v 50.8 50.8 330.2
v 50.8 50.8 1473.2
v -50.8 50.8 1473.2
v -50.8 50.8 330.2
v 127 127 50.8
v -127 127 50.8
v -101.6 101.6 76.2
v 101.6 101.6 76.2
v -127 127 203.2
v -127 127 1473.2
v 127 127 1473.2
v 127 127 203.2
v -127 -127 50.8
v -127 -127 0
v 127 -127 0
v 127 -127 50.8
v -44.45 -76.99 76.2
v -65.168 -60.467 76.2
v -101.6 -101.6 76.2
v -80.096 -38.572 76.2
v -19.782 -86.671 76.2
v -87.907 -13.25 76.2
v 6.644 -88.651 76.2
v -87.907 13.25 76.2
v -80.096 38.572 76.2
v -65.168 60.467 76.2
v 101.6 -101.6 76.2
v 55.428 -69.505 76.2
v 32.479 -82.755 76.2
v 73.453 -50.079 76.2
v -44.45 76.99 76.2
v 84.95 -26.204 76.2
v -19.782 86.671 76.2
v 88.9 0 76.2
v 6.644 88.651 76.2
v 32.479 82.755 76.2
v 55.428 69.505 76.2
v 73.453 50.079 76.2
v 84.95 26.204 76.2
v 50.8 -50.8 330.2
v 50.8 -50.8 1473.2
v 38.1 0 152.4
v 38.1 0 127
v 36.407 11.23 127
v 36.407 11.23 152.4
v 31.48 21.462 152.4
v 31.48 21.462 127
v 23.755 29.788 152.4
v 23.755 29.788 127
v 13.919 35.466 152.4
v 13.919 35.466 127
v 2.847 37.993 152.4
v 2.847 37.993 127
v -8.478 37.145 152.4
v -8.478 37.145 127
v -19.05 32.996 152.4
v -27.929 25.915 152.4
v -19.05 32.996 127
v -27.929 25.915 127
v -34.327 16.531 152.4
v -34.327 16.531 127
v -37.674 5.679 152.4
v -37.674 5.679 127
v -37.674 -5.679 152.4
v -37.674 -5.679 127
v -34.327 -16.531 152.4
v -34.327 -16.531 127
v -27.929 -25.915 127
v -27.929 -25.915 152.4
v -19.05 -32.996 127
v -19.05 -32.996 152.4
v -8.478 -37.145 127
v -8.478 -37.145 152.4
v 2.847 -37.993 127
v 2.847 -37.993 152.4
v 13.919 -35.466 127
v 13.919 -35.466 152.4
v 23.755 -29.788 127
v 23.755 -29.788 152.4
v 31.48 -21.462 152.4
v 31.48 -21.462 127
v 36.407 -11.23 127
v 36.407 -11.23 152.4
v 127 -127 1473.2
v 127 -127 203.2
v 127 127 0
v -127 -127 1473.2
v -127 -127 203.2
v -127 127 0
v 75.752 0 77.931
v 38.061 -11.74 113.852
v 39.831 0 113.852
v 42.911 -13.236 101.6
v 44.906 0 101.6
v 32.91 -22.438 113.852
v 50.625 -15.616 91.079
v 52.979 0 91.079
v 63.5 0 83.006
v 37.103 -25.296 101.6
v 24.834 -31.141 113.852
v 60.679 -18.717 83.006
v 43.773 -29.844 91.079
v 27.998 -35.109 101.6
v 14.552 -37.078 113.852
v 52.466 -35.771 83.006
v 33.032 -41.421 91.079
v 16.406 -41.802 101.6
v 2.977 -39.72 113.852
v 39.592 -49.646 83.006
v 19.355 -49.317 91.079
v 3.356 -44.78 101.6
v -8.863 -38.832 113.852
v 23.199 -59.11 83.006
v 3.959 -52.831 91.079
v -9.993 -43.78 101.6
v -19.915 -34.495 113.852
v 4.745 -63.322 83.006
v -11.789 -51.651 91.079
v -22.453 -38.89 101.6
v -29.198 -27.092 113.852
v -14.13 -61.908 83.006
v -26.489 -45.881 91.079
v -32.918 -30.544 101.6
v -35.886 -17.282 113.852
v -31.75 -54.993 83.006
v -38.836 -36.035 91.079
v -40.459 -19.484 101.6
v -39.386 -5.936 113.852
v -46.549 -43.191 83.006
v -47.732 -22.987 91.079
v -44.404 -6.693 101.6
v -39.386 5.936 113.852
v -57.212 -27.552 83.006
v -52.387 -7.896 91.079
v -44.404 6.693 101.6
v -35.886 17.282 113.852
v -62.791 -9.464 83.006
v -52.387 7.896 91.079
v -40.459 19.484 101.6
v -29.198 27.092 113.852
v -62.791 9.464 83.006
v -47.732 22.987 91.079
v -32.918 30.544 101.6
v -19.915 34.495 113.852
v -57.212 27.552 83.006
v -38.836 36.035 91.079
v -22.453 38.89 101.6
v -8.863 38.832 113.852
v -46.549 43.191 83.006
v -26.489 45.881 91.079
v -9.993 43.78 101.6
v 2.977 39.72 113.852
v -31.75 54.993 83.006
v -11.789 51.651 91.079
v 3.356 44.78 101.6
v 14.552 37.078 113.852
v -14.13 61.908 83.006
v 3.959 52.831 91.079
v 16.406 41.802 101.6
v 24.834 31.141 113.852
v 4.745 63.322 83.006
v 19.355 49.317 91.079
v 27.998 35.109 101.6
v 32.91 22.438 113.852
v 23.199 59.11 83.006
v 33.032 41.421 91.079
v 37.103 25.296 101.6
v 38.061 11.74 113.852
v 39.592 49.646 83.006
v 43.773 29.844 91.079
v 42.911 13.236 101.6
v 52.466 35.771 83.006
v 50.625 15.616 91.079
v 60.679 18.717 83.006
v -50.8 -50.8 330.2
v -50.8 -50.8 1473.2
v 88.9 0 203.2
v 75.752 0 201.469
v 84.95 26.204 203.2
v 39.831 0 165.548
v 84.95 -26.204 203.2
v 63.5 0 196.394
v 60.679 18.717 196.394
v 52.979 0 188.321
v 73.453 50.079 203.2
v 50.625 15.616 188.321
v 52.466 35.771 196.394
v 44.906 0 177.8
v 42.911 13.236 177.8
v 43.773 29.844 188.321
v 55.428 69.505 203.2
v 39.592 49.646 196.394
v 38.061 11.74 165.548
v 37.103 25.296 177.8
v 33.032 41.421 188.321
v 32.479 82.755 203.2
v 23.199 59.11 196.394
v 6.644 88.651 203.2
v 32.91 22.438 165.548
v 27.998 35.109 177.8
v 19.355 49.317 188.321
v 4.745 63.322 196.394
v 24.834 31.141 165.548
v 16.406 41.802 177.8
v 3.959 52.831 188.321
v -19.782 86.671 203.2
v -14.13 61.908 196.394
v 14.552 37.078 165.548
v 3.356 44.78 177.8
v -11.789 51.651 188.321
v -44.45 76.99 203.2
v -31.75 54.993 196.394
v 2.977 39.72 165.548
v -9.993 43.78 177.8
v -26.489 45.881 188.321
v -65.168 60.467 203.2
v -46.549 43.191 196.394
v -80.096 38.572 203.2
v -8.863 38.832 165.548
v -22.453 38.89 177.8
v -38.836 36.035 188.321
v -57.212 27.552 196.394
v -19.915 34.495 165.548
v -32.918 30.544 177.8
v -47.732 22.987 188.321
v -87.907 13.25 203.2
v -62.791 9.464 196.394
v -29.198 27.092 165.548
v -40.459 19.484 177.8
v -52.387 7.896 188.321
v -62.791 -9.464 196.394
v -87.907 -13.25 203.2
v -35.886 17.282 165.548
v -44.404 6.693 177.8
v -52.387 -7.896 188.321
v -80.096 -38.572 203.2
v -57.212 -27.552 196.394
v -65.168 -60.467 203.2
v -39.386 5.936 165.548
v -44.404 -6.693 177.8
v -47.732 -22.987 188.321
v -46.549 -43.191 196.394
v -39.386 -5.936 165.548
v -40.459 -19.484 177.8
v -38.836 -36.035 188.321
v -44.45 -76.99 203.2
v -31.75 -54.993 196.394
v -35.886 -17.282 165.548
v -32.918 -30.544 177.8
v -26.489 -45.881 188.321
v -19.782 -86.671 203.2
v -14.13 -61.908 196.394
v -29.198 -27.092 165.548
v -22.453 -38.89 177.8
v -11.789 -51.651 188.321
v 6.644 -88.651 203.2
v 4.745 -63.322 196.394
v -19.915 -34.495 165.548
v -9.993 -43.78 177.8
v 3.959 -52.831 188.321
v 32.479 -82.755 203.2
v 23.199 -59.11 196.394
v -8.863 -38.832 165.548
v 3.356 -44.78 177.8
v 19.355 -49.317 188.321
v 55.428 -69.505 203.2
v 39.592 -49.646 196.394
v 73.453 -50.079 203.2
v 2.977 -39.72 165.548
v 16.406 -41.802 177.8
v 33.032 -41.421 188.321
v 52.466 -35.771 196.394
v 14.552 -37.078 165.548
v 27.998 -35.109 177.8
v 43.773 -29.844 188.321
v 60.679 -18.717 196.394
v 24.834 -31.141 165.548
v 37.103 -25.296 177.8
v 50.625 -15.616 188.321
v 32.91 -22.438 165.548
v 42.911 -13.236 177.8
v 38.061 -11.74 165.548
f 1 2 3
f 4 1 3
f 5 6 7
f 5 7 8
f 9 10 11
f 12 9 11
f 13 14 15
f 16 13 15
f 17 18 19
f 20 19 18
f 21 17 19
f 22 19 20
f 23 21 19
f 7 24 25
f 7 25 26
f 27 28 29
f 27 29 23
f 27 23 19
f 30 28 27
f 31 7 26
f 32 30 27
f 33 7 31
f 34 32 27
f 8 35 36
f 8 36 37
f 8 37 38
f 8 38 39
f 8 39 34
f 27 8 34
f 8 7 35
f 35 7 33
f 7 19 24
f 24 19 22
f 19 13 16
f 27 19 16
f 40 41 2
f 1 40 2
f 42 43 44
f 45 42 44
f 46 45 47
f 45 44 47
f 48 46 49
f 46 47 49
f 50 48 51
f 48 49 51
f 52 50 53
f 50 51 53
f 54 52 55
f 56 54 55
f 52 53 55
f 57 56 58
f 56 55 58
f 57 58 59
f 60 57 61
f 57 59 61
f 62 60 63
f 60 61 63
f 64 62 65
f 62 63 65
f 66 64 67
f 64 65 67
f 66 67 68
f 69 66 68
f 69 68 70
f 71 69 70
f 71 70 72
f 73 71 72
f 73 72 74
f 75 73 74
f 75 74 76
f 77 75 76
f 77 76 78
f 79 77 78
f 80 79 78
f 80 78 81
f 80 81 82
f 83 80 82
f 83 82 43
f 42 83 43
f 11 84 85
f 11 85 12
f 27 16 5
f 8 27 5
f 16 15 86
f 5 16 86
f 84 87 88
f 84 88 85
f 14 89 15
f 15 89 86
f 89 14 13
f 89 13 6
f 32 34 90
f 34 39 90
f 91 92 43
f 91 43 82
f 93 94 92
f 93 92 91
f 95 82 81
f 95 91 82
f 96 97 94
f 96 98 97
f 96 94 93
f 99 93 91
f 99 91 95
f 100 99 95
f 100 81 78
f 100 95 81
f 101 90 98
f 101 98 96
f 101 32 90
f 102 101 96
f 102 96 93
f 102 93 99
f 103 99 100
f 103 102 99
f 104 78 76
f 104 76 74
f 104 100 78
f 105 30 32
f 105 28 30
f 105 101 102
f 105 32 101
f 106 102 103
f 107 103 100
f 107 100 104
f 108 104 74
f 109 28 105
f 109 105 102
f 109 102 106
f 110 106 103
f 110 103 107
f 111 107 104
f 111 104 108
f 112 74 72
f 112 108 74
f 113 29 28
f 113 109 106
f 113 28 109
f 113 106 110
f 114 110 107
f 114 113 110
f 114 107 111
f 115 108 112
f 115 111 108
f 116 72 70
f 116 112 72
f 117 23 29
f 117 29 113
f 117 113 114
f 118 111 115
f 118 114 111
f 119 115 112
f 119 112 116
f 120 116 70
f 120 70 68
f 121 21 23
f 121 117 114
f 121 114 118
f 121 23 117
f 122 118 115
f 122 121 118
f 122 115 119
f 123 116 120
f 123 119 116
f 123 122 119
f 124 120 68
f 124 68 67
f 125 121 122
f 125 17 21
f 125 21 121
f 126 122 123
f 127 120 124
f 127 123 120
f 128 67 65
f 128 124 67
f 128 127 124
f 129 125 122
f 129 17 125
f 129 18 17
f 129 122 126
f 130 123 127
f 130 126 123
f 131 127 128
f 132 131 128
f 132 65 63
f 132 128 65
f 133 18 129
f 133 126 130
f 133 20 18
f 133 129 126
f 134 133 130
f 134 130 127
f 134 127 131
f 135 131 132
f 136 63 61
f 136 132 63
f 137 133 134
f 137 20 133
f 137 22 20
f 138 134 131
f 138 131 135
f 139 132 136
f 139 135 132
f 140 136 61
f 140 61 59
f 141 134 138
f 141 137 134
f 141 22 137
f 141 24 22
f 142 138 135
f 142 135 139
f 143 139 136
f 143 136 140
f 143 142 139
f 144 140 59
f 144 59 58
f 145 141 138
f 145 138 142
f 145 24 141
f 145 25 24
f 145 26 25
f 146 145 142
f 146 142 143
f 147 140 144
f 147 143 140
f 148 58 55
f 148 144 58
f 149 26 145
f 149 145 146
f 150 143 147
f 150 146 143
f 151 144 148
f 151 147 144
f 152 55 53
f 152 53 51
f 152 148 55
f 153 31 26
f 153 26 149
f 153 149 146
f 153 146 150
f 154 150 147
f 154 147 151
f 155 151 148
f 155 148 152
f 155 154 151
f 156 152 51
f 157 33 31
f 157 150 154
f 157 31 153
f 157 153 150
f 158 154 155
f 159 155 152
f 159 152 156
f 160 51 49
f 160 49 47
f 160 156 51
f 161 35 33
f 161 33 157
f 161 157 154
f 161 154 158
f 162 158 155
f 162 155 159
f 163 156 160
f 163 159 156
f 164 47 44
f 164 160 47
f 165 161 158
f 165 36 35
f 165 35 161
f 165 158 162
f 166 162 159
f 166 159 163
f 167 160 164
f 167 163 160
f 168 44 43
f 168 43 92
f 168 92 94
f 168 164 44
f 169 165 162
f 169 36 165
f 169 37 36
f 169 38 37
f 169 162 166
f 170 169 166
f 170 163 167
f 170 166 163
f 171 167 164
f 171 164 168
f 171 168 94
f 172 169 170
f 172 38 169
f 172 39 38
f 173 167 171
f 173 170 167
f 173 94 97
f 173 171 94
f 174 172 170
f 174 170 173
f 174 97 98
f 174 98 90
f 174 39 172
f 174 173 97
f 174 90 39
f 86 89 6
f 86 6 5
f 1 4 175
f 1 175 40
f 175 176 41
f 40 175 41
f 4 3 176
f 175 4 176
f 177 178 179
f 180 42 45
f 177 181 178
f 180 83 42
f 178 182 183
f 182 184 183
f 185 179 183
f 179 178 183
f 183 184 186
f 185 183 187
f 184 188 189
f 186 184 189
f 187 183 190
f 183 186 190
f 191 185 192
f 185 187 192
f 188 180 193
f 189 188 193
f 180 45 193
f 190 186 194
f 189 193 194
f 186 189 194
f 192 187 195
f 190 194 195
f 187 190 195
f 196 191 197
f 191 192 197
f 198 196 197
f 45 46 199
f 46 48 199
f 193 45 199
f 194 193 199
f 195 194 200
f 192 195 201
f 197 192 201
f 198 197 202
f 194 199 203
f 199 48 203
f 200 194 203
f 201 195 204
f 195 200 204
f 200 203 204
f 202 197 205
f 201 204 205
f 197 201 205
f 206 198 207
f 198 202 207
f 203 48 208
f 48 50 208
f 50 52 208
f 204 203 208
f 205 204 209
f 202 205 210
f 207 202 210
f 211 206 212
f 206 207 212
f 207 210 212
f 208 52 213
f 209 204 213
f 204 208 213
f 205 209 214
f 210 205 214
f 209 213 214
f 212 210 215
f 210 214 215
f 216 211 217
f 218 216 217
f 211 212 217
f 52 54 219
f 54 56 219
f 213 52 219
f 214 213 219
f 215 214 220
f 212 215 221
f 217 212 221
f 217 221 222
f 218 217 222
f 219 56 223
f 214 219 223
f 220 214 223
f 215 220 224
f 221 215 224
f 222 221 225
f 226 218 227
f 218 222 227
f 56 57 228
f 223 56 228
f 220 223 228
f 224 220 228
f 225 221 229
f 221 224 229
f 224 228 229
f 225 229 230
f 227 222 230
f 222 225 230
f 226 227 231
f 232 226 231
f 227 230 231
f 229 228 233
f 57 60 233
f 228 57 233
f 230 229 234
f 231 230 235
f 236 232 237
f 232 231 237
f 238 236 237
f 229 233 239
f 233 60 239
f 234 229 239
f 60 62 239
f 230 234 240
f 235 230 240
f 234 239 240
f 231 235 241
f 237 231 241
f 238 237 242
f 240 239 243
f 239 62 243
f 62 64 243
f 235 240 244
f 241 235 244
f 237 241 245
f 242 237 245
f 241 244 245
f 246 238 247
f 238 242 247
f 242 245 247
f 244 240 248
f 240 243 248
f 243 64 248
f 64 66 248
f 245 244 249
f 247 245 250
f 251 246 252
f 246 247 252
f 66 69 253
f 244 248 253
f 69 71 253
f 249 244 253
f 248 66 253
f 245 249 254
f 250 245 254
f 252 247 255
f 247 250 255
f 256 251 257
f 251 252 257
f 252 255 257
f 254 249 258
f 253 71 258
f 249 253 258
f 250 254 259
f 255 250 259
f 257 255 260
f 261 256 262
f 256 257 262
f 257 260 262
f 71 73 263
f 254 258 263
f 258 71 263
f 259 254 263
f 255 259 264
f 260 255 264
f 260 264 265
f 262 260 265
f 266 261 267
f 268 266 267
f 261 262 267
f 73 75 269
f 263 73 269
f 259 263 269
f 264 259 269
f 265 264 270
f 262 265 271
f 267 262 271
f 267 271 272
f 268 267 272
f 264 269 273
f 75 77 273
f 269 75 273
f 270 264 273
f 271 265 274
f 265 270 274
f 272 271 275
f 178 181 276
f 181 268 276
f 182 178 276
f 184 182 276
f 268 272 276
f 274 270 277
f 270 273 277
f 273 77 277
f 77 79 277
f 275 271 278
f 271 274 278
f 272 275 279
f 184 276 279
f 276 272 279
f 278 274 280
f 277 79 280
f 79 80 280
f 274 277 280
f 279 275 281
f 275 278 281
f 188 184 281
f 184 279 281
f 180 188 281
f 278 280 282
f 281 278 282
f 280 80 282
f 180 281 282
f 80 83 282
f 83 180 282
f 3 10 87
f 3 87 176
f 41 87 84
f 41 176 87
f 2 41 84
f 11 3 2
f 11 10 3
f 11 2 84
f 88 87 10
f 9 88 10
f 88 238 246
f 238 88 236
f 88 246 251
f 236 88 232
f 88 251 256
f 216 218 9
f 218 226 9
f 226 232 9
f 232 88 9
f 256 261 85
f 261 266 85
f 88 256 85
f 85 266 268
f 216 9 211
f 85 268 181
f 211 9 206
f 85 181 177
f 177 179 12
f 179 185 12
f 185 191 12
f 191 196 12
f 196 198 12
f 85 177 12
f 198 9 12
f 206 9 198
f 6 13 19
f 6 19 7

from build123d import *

# Parameters (mm, degrees)
F0_W     = 254
F0_H     = 254
F0_R     = 38.1
F1_DEPTH = 76.2
F2_DEPTH = 203.2
F3_W     = 254
F3_H     = 254
F3_R     = 38.1
F4_DEPTH = 1270
F6_DEPTH = 1143
F7_R     = 50.8
F8_SIZE  = 25.4


with BuildPart() as f1:
    # F0 (on Top) → F1 (new body)
    with BuildSketch(Plane.XY):
        Rectangle(F0_W, F0_H)
        Circle(F0_R, mode=Mode.SUBTRACT)
        Circle(F0_R)
    extrude(amount=F1_DEPTH)

    # F0 (on Top) → F2 (join)
    with BuildSketch(Plane.XY):
        Circle(F0_R)
    extrude(amount=F2_DEPTH)

    # F3 (on face) → F4 (join)
    with BuildSketch(Plane.XY.offset(203.2)):
        Rectangle(F3_W, F3_H)
        Circle(F3_R)
    extrude(amount=F4_DEPTH)

    # F5 (on face) → F6 (cut)
    with BuildSketch(Plane.XY.offset(1473.2)):
        with BuildLine():
            Line((50.8, 0), (50.8, 50.8))
            Line((50.8, 50.8), (0, 50.8))
            ThreePointArc((0, 50.8), (35.921025, 35.921024), (50.8, 0))
        make_face()
        with BuildLine():
            Line((50.8, -50.8), (50.8, 0))
            ThreePointArc((50.8, 0), (35.921024, -35.921024), (0, -50.8))
            Line((0, -50.8), (50.8, -50.8))
        make_face()
        with BuildLine():
            ThreePointArc((0, -50.8), (-35.921024, -35.921025), (-50.8, 0))
            Line((-50.8, 0), (-50.8, -50.8))
            Line((-50.8, -50.8), (0, -50.8))
        make_face()
        with BuildLine():
            ThreePointArc((-50.8, 0), (-35.921025, 35.921024), (0, 50.8))
            Line((0, 50.8), (-50.8, 50.8))
            Line((-50.8, 50.8), (-50.8, 0))
        make_face()
        with BuildLine():
            ThreePointArc((50.8, 0), (35.921025, 35.921024), (0, 50.8))
            ThreePointArc((0, 50.8), (-35.921025, 35.921024), (-50.8, 0))
            ThreePointArc((-50.8, 0), (-35.921024, -35.921025), (0, -50.8))
            ThreePointArc((0, -50.8), (35.921024, -35.921024), (50.8, 0))
        make_face()
    extrude(amount=-F6_DEPTH, mode=Mode.SUBTRACT)

    # F7
    f7_edges = [f1.edges().sort_by_distance(p)[0] for p in [
        (-38.1, 0, 76.2),
        (-38.1, 0, 203.2),
    ]]
    fillet(f7_edges, radius=F7_R)

    # F8
    f8_edges = [f1.edges().sort_by_distance(p)[0] for p in [
        (0, -127, 76.2),
        (127, 0, 76.2),
        (0, 127, 76.2),
        (-127, 0, 76.2),
    ]]
    chamfer(f8_edges, length=F8_SIZE)


solid = f1.part
